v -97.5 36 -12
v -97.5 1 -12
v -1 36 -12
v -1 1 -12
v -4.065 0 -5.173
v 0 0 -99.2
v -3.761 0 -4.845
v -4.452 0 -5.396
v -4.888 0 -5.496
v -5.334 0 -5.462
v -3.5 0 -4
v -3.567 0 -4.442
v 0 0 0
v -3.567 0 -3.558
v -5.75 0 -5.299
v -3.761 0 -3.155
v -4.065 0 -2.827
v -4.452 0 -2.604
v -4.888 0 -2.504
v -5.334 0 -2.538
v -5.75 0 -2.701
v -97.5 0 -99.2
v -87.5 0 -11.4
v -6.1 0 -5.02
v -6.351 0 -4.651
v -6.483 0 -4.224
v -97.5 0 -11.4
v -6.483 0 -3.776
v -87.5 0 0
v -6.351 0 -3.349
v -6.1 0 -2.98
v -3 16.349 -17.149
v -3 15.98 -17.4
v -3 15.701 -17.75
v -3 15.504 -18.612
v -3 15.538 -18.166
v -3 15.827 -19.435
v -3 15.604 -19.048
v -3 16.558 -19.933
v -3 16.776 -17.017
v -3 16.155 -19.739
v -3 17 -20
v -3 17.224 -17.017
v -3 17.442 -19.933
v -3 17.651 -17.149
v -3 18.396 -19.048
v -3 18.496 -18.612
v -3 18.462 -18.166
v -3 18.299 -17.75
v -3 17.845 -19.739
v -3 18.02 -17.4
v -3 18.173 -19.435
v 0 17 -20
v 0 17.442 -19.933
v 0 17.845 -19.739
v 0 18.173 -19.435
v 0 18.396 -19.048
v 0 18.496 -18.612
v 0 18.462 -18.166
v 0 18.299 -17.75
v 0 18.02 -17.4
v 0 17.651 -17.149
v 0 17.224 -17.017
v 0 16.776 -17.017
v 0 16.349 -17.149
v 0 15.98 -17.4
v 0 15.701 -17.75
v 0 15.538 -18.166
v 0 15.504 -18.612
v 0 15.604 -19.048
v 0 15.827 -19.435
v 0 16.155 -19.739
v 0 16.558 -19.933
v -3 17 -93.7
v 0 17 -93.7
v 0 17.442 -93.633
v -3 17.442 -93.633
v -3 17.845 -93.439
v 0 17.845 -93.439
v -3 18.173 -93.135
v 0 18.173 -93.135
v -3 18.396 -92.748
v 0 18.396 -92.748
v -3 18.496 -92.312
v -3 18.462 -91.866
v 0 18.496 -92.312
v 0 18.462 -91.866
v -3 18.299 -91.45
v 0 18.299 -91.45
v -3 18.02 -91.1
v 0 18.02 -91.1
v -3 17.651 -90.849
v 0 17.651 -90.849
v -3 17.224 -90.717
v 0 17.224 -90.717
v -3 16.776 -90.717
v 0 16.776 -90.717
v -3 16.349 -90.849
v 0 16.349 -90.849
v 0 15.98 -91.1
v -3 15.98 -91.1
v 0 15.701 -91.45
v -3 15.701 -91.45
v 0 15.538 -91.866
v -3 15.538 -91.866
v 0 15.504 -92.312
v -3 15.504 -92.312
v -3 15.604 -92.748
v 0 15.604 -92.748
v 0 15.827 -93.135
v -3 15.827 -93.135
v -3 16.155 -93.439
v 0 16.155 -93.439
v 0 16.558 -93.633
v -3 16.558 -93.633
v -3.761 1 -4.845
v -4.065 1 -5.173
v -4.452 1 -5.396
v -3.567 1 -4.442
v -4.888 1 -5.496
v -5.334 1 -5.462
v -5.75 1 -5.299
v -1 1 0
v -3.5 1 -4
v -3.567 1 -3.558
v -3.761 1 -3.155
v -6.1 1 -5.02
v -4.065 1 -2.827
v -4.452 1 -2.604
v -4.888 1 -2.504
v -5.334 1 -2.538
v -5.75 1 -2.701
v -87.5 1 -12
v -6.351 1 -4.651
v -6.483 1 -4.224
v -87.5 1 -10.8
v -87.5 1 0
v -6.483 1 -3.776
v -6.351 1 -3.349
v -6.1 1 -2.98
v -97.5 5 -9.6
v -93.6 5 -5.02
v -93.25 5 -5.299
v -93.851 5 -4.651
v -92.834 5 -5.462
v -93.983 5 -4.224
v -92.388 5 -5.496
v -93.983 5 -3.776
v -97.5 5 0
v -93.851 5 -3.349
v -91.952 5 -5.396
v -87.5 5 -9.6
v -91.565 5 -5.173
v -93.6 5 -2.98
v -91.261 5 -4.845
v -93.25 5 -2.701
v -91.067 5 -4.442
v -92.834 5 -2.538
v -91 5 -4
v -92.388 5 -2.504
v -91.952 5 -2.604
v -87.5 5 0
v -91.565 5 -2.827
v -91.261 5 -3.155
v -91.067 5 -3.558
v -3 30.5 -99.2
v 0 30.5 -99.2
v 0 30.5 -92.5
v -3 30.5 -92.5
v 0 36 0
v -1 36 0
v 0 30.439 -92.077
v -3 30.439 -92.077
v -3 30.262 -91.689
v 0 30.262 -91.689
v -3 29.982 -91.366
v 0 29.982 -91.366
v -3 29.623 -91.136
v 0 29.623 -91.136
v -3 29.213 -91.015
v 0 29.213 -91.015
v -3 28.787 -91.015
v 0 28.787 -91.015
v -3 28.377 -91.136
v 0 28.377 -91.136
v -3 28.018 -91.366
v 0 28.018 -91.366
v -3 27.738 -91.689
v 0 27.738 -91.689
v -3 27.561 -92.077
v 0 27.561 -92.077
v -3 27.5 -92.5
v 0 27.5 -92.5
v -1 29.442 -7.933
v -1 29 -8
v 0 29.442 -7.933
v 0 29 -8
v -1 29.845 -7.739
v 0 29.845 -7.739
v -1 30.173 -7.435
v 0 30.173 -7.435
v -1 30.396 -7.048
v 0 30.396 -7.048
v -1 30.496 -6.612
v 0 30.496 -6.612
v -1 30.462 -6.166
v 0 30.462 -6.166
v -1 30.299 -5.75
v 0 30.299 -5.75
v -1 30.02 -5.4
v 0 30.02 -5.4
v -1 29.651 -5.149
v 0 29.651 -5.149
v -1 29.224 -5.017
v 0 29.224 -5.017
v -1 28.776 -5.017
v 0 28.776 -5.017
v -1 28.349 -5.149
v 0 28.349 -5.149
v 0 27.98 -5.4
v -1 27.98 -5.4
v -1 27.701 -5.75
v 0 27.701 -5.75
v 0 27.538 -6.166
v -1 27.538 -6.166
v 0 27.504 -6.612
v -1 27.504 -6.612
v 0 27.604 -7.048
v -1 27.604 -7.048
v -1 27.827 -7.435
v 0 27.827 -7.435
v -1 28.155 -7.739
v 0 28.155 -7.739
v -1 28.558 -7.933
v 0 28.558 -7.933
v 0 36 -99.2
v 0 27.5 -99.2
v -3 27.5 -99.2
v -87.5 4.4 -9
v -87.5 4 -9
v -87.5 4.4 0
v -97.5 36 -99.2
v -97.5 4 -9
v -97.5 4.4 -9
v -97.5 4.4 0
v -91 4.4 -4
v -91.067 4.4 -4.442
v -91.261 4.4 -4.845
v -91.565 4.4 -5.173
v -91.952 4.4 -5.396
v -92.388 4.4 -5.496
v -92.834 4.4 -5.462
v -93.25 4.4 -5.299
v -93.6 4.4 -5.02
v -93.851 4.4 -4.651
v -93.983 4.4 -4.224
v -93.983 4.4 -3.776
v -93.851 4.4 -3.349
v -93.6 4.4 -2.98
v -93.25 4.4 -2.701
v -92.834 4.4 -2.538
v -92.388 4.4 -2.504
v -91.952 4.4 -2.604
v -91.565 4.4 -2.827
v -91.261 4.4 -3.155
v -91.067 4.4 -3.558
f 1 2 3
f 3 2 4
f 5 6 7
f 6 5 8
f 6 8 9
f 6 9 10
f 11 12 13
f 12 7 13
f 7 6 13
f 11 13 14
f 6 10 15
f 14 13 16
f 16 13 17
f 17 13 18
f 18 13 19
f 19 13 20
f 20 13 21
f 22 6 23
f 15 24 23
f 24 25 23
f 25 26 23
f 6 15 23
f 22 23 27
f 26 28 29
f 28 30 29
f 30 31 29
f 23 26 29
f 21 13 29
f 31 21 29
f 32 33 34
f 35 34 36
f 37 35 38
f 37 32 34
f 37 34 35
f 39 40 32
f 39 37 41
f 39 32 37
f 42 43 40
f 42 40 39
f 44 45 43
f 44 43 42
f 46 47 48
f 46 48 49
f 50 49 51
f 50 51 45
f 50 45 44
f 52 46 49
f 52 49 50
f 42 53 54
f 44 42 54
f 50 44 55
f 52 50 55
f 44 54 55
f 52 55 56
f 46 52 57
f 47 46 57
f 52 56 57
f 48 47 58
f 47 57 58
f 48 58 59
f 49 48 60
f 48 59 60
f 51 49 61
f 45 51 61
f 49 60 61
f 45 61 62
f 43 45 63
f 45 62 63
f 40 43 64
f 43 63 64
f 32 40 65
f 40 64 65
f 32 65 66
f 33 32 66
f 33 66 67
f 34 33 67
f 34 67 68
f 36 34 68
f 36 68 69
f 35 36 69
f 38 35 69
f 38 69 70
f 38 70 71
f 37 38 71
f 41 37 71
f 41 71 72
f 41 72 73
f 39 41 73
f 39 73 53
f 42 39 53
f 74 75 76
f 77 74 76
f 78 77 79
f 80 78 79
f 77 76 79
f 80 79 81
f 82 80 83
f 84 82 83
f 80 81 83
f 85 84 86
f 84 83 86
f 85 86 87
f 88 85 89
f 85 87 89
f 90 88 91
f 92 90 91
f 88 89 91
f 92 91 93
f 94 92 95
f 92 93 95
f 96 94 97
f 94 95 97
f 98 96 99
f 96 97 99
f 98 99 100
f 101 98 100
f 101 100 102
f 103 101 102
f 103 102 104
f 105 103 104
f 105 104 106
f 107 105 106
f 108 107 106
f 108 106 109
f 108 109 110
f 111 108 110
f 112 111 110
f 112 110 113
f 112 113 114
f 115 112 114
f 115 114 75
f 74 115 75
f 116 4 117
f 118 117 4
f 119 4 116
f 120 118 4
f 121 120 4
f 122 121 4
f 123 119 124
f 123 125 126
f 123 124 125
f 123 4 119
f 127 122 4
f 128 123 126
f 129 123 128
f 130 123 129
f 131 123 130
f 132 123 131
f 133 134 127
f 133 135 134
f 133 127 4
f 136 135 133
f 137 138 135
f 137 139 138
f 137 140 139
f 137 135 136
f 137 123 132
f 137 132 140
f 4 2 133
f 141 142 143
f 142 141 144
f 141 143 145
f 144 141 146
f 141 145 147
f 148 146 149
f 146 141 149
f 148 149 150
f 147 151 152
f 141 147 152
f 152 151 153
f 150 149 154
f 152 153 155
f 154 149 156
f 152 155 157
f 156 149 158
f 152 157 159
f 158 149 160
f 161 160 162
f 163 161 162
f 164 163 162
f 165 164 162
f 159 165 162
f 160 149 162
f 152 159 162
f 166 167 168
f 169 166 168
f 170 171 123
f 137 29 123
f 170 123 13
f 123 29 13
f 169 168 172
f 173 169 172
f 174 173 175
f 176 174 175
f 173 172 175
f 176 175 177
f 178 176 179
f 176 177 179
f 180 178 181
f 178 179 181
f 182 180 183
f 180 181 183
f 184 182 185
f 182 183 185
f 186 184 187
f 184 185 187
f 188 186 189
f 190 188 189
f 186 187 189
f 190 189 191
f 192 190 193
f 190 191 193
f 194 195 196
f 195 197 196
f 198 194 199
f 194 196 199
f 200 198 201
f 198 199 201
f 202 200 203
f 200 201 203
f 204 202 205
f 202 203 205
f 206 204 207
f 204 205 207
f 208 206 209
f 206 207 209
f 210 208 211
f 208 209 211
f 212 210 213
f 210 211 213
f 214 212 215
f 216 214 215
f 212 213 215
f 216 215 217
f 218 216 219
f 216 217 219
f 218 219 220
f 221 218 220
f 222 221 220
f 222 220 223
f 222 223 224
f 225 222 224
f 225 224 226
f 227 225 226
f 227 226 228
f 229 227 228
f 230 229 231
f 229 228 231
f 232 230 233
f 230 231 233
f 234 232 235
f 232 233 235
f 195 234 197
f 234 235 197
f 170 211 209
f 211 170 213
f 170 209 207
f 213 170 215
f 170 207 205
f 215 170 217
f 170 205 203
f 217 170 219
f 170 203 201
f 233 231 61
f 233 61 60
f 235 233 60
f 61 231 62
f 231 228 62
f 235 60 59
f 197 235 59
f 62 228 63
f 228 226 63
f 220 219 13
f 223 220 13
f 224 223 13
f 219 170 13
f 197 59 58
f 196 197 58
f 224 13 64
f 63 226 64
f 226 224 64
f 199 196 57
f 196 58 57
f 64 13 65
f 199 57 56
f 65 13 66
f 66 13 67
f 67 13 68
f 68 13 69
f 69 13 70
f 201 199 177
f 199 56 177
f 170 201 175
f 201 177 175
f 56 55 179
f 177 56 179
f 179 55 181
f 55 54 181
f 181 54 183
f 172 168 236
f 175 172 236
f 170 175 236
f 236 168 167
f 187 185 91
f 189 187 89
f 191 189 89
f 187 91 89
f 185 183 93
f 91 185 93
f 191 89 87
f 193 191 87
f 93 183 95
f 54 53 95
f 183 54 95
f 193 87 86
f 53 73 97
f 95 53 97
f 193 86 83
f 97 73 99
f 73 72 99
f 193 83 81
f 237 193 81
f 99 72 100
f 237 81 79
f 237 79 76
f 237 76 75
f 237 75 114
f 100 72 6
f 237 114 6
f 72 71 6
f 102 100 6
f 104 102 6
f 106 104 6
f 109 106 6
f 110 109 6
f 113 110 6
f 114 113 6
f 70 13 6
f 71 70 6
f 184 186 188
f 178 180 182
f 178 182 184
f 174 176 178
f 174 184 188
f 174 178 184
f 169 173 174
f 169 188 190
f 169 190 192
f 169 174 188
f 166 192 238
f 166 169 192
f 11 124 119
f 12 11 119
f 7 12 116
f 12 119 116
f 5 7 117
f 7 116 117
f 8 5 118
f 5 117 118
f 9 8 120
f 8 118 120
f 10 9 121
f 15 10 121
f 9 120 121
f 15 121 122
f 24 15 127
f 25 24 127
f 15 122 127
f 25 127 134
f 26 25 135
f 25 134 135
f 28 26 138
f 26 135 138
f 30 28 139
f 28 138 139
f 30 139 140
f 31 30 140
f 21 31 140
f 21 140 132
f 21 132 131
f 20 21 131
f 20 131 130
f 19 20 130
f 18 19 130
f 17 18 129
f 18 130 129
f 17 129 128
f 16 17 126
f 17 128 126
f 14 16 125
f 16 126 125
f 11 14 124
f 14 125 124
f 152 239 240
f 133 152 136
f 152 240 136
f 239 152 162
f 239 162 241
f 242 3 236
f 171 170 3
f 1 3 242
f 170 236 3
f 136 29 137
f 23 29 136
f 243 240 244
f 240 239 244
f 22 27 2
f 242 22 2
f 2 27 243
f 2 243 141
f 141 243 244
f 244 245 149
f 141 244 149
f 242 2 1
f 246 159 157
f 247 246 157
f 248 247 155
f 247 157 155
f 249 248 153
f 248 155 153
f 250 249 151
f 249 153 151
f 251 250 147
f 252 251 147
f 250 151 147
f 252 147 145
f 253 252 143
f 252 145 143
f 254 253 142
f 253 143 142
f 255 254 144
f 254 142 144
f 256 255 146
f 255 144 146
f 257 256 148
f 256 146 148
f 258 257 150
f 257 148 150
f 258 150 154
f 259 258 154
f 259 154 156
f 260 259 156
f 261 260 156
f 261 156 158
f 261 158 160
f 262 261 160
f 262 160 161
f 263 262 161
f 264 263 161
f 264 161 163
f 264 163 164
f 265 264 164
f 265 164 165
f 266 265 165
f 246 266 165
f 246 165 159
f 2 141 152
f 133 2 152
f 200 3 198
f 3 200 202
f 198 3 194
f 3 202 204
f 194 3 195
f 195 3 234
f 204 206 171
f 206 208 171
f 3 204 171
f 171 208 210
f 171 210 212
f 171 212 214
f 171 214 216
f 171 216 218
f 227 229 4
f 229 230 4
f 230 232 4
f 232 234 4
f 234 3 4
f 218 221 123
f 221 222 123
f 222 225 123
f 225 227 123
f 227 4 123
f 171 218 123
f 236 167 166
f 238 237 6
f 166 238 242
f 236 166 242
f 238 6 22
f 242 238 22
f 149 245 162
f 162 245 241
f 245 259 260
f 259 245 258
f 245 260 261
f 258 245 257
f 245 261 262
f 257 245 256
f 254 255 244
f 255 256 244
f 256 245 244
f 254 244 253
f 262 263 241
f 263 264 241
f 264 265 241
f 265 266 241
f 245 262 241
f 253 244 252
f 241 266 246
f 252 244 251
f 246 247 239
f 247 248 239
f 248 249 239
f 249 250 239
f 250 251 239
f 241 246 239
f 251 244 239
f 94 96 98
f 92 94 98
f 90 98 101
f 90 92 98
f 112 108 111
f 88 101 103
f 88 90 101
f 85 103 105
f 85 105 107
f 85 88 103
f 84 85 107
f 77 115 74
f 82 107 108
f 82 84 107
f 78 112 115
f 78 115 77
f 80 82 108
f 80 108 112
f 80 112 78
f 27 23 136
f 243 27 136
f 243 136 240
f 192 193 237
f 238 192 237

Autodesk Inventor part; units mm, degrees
ref_plane "YZ Plane" through (0, 0, 0) normal (1, 0, 0) x (0, 1, 0)
ref_plane "XZ Plane" through (0, 0, 0) normal (0, 1, 0) x (-1, 0, 0)
ref_plane "XY Plane" through (0, 0, 0) normal (0, 0, 1) x (1, 0, 0)
sketch "스케치1" plane through (0, 0, 0) normal (0, 1, 0) x (-1, 0, 0)
  line L0 (0, 0) -> (97.5, 0)
  line L1 (97.5, 0) -> (97.5, -99.2)
  line L2 (97.5, -99.2) -> (0, -99.2)
  line L3 (0, -99.2) -> (0, 0)
  line L4 (97.5, 0) -> (1, 0)
  line L5 (1, 0) -> (1, -12)
  line L6 (1, -12) -> (97.5, -12)
  line L7 (97.5, -12) -> (97.5, 0)
  point P0 (1, -6)
  point P1 (97.5, -6)
  point P2 (48.75, 0)
  dimension "d0" = 97.5
  dimension "d1" = 99.2
  dimension "d2" = 96.5
  dimension "d3" = 12
  dimension "d6" = 1
sketch "스케치1 outline for 돌출1" plane through (0, 0, 0) normal (0, 1, 0) x (-1, 0, 0)
  line L0 (0, 0) -> (0, -99.2)
  line L1 (1, 0) -> (0, 0)
  line L2 (1, -12) -> (1, 0)
  line L3 (97.5, -12) -> (1, -12)
  line L4 (97.5, -99.2) -> (97.5, -12)
  line L5 (0, -99.2) -> (97.5, -99.2)
extrude "돌출1" add sketch "스케치1 outline for 돌출1" along normal blind 36
sketch "스케치1 outline for 돌출2" plane through (0, 0, 0) normal (0, 1, 0) x (-1, 0, 0)
  line L0 (1, -12) -> (97.5, -12)
  line L1 (1, 0) -> (1, -12)
  line L2 (97.5, 0) -> (1, 0)
  line L3 (97.5, -12) -> (97.5, 0)
extrude "돌출2" add sketch "스케치1 outline for 돌출2" along normal blind 1
sketch "스케치2" plane through (0, 1, 0) normal (0, 1, 0) x (1, 0, 0)
  circle A0 centre (-5, 4) radius 1.5
  line L0 (0, 0) -> (0, 99.2) projected
  line L1 (-97.5, 0) -> (-1, 0) projected
  line L2 (-97.5, 0) -> (0, 0) projected
  line L3 (-97.5, 0) -> (-87.5, 0)
  line L4 (-87.5, 0) -> (-87.5, 9)
  line L5 (-87.5, 9) -> (-97.5, 9)
  line L6 (-97.5, 9) -> (-97.5, 0)
  dimension "d11" = 3
  dimension "d13" = 5
  dimension "d14" = 4
  dimension "d15" = 10
  dimension "d16" = 9
sketch "스케치2 outline for 돌출3" plane through (0, 1, 0) normal (0, 1, 0) x (1, 0, 0)
  line L0 (-97.5, 9) -> (-97.5, 0)
  line L1 (-87.5, 9) -> (-97.5, 9)
  line L2 (-87.5, 0) -> (-87.5, 9)
  line L3 (-97.5, 0) -> (-87.5, 0)
extrude "돌출3" cut sketch "스케치2 outline for 돌출3" against normal blind 1
sketch "스케치2 outline for 돌출4" plane through (0, 1, 0) normal (0, 1, 0) x (1, 0, 0)
  line L0 (-97.5, 9) -> (-97.5, 0)
  line L1 (-87.5, 9) -> (-97.5, 9)
  line L2 (-87.5, 0) -> (-87.5, 9)
  line L3 (-97.5, 0) -> (-87.5, 0)
extrude "돌출4" add sketch "스케치2 outline for 돌출4" along normal blind 4
sketch "스케치2 outline for 돌출5" plane through (0, 1, 0) normal (0, 1, 0) x (1, 0, 0)
  line L0 (-97.5, 9) -> (-97.5, 0)
  line L1 (-87.5, 9) -> (-97.5, 9)
  line L2 (-87.5, 0) -> (-87.5, 9)
  line L3 (-97.5, 0) -> (-87.5, 0)
extrude "돌출5" cut sketch "스케치2 outline for 돌출5" along normal blind 3.4
sketch "스케치3" plane through (-87.5, 5, -9) normal (0, 0, -1) x (-1, 0, 0)
  line L0 (0, 0) -> (10, 0)
  line L1 (10, 0) -> (10, -4)
  line L2 (10, -4) -> (0, -4)
  line L3 (0, -4) -> (0, 0)
  point P0 (-87.5, -5)
  point P1 (0, -0.6)
sketch "스케치3 outline for 돌출6" plane through (-87.5, 5, -9) normal (0, 0, -1) x (-1, 0, 0)
  line L0 (0, 0) -> (0, -4)
  line L1 (10, 0) -> (0, 0)
  line L2 (10, -4) -> (10, 0)
  line L3 (0, -4) -> (10, -4)
extrude "돌출6" add sketch "스케치3 outline for 돌출6" along normal blind 0.6
chamfer "모따기1" distance 2.4 distance2 4 1 edges at (-92.5, 1, -9.6) measured on face at (-29.8333, 1, -7)
chamfer "모따기2" distance 2.4 distance2 4 1 edges at (-92.5, 0, -9)
sketch "스케치4" plane through (0, 5, 0) normal (0, 1, 0) x (1, 0, 0)
  circle A0 centre (-92.5, 4) radius 1.5
  line L0 (-97.5, 0) -> (-97.5, 9.6) projected
  line L1 (-97.5, 0) -> (-87.5, 0) projected
  point P0 (0, 0)
  point P1 (-97.5, 4.8)
  dimension "d31" = 3
  dimension "d32" = 5
  dimension "d33" = 4
sketch "스케치2 outline for 돌출7" plane through (0, 1, 0) normal (0, 1, 0) x (1, 0, 0)
  circle A0 centre (-5, 4) radius 1.5
extrude "돌출7" cut sketch "스케치2 outline for 돌출7" against normal blind 3.1
sketch "스케치4 outline for 돌출8" plane through (0, 5, 0) normal (0, 1, 0) x (1, 0, 0)
  circle A0 centre (-92.5, 4) radius 1.5
extrude "돌출8" cut sketch "스케치4 outline for 돌출8" against normal blind 3.1
sketch "스케치5" plane through (0, 0, 0) normal (1, 0, 0) x (0, 0, -1)
  circle A0 centre (18.5, 17) radius 1.5
  circle A1 centre (92.2, 17) radius 1.5
  line L0 (0, 0) -> (99.2, 0) projected
  line L1 (99.2, 0) -> (99.2, 36) projected
  circle A2 centre (6.5, 29) radius 1.5
  circle A3 centre (92.5, 29) radius 1.5
  line L2 (0, 36) -> (99.2, 36) projected
  line L3 (0, 0) -> (0, 36) projected
  line L4 (92.5, 30.5) -> (99.2, 30.5)
  line L5 (99.2, 30.5) -> (99.2, 27.5)
  line L6 (99.2, 27.5) -> (92.5, 27.5)
  line L7 (92.5, 27.5) -> (92.5, 30.5)
  dimension "d44" = 3
  dimension "d38" = 3
  dimension "d39" = 3
  dimension "d40" = 17
  dimension "d41" = 73.7
  dimension "d42" = 7
  dimension "d43" = 3
  dimension "d45" = 7
  dimension "d46" = 6.5
  dimension "d48" = 86
sketch "스케치5 outline for 돌출9" plane through (0, 0, 0) normal (1, 0, 0) x (0, 0, -1)
  circle A0 centre (6.5, 29) radius 1.5
  circle A1 centre (18.5, 17) radius 1.5
  line L0 (92.5, 27.5) -> (99.2, 27.5)
  arc A2 (92.5, 30.5) -> (92.5, 27.5) centre (92.5, 29) ccw
  line L1 (99.2, 30.5) -> (92.5, 30.5)
  line L2 (99.2, 27.5) -> (99.2, 30.5)
  circle A3 centre (92.2, 17) radius 1.5
extrude "돌출9" cut sketch "스케치5 outline for 돌출9" against normal blind 3
properties part number "smps"
